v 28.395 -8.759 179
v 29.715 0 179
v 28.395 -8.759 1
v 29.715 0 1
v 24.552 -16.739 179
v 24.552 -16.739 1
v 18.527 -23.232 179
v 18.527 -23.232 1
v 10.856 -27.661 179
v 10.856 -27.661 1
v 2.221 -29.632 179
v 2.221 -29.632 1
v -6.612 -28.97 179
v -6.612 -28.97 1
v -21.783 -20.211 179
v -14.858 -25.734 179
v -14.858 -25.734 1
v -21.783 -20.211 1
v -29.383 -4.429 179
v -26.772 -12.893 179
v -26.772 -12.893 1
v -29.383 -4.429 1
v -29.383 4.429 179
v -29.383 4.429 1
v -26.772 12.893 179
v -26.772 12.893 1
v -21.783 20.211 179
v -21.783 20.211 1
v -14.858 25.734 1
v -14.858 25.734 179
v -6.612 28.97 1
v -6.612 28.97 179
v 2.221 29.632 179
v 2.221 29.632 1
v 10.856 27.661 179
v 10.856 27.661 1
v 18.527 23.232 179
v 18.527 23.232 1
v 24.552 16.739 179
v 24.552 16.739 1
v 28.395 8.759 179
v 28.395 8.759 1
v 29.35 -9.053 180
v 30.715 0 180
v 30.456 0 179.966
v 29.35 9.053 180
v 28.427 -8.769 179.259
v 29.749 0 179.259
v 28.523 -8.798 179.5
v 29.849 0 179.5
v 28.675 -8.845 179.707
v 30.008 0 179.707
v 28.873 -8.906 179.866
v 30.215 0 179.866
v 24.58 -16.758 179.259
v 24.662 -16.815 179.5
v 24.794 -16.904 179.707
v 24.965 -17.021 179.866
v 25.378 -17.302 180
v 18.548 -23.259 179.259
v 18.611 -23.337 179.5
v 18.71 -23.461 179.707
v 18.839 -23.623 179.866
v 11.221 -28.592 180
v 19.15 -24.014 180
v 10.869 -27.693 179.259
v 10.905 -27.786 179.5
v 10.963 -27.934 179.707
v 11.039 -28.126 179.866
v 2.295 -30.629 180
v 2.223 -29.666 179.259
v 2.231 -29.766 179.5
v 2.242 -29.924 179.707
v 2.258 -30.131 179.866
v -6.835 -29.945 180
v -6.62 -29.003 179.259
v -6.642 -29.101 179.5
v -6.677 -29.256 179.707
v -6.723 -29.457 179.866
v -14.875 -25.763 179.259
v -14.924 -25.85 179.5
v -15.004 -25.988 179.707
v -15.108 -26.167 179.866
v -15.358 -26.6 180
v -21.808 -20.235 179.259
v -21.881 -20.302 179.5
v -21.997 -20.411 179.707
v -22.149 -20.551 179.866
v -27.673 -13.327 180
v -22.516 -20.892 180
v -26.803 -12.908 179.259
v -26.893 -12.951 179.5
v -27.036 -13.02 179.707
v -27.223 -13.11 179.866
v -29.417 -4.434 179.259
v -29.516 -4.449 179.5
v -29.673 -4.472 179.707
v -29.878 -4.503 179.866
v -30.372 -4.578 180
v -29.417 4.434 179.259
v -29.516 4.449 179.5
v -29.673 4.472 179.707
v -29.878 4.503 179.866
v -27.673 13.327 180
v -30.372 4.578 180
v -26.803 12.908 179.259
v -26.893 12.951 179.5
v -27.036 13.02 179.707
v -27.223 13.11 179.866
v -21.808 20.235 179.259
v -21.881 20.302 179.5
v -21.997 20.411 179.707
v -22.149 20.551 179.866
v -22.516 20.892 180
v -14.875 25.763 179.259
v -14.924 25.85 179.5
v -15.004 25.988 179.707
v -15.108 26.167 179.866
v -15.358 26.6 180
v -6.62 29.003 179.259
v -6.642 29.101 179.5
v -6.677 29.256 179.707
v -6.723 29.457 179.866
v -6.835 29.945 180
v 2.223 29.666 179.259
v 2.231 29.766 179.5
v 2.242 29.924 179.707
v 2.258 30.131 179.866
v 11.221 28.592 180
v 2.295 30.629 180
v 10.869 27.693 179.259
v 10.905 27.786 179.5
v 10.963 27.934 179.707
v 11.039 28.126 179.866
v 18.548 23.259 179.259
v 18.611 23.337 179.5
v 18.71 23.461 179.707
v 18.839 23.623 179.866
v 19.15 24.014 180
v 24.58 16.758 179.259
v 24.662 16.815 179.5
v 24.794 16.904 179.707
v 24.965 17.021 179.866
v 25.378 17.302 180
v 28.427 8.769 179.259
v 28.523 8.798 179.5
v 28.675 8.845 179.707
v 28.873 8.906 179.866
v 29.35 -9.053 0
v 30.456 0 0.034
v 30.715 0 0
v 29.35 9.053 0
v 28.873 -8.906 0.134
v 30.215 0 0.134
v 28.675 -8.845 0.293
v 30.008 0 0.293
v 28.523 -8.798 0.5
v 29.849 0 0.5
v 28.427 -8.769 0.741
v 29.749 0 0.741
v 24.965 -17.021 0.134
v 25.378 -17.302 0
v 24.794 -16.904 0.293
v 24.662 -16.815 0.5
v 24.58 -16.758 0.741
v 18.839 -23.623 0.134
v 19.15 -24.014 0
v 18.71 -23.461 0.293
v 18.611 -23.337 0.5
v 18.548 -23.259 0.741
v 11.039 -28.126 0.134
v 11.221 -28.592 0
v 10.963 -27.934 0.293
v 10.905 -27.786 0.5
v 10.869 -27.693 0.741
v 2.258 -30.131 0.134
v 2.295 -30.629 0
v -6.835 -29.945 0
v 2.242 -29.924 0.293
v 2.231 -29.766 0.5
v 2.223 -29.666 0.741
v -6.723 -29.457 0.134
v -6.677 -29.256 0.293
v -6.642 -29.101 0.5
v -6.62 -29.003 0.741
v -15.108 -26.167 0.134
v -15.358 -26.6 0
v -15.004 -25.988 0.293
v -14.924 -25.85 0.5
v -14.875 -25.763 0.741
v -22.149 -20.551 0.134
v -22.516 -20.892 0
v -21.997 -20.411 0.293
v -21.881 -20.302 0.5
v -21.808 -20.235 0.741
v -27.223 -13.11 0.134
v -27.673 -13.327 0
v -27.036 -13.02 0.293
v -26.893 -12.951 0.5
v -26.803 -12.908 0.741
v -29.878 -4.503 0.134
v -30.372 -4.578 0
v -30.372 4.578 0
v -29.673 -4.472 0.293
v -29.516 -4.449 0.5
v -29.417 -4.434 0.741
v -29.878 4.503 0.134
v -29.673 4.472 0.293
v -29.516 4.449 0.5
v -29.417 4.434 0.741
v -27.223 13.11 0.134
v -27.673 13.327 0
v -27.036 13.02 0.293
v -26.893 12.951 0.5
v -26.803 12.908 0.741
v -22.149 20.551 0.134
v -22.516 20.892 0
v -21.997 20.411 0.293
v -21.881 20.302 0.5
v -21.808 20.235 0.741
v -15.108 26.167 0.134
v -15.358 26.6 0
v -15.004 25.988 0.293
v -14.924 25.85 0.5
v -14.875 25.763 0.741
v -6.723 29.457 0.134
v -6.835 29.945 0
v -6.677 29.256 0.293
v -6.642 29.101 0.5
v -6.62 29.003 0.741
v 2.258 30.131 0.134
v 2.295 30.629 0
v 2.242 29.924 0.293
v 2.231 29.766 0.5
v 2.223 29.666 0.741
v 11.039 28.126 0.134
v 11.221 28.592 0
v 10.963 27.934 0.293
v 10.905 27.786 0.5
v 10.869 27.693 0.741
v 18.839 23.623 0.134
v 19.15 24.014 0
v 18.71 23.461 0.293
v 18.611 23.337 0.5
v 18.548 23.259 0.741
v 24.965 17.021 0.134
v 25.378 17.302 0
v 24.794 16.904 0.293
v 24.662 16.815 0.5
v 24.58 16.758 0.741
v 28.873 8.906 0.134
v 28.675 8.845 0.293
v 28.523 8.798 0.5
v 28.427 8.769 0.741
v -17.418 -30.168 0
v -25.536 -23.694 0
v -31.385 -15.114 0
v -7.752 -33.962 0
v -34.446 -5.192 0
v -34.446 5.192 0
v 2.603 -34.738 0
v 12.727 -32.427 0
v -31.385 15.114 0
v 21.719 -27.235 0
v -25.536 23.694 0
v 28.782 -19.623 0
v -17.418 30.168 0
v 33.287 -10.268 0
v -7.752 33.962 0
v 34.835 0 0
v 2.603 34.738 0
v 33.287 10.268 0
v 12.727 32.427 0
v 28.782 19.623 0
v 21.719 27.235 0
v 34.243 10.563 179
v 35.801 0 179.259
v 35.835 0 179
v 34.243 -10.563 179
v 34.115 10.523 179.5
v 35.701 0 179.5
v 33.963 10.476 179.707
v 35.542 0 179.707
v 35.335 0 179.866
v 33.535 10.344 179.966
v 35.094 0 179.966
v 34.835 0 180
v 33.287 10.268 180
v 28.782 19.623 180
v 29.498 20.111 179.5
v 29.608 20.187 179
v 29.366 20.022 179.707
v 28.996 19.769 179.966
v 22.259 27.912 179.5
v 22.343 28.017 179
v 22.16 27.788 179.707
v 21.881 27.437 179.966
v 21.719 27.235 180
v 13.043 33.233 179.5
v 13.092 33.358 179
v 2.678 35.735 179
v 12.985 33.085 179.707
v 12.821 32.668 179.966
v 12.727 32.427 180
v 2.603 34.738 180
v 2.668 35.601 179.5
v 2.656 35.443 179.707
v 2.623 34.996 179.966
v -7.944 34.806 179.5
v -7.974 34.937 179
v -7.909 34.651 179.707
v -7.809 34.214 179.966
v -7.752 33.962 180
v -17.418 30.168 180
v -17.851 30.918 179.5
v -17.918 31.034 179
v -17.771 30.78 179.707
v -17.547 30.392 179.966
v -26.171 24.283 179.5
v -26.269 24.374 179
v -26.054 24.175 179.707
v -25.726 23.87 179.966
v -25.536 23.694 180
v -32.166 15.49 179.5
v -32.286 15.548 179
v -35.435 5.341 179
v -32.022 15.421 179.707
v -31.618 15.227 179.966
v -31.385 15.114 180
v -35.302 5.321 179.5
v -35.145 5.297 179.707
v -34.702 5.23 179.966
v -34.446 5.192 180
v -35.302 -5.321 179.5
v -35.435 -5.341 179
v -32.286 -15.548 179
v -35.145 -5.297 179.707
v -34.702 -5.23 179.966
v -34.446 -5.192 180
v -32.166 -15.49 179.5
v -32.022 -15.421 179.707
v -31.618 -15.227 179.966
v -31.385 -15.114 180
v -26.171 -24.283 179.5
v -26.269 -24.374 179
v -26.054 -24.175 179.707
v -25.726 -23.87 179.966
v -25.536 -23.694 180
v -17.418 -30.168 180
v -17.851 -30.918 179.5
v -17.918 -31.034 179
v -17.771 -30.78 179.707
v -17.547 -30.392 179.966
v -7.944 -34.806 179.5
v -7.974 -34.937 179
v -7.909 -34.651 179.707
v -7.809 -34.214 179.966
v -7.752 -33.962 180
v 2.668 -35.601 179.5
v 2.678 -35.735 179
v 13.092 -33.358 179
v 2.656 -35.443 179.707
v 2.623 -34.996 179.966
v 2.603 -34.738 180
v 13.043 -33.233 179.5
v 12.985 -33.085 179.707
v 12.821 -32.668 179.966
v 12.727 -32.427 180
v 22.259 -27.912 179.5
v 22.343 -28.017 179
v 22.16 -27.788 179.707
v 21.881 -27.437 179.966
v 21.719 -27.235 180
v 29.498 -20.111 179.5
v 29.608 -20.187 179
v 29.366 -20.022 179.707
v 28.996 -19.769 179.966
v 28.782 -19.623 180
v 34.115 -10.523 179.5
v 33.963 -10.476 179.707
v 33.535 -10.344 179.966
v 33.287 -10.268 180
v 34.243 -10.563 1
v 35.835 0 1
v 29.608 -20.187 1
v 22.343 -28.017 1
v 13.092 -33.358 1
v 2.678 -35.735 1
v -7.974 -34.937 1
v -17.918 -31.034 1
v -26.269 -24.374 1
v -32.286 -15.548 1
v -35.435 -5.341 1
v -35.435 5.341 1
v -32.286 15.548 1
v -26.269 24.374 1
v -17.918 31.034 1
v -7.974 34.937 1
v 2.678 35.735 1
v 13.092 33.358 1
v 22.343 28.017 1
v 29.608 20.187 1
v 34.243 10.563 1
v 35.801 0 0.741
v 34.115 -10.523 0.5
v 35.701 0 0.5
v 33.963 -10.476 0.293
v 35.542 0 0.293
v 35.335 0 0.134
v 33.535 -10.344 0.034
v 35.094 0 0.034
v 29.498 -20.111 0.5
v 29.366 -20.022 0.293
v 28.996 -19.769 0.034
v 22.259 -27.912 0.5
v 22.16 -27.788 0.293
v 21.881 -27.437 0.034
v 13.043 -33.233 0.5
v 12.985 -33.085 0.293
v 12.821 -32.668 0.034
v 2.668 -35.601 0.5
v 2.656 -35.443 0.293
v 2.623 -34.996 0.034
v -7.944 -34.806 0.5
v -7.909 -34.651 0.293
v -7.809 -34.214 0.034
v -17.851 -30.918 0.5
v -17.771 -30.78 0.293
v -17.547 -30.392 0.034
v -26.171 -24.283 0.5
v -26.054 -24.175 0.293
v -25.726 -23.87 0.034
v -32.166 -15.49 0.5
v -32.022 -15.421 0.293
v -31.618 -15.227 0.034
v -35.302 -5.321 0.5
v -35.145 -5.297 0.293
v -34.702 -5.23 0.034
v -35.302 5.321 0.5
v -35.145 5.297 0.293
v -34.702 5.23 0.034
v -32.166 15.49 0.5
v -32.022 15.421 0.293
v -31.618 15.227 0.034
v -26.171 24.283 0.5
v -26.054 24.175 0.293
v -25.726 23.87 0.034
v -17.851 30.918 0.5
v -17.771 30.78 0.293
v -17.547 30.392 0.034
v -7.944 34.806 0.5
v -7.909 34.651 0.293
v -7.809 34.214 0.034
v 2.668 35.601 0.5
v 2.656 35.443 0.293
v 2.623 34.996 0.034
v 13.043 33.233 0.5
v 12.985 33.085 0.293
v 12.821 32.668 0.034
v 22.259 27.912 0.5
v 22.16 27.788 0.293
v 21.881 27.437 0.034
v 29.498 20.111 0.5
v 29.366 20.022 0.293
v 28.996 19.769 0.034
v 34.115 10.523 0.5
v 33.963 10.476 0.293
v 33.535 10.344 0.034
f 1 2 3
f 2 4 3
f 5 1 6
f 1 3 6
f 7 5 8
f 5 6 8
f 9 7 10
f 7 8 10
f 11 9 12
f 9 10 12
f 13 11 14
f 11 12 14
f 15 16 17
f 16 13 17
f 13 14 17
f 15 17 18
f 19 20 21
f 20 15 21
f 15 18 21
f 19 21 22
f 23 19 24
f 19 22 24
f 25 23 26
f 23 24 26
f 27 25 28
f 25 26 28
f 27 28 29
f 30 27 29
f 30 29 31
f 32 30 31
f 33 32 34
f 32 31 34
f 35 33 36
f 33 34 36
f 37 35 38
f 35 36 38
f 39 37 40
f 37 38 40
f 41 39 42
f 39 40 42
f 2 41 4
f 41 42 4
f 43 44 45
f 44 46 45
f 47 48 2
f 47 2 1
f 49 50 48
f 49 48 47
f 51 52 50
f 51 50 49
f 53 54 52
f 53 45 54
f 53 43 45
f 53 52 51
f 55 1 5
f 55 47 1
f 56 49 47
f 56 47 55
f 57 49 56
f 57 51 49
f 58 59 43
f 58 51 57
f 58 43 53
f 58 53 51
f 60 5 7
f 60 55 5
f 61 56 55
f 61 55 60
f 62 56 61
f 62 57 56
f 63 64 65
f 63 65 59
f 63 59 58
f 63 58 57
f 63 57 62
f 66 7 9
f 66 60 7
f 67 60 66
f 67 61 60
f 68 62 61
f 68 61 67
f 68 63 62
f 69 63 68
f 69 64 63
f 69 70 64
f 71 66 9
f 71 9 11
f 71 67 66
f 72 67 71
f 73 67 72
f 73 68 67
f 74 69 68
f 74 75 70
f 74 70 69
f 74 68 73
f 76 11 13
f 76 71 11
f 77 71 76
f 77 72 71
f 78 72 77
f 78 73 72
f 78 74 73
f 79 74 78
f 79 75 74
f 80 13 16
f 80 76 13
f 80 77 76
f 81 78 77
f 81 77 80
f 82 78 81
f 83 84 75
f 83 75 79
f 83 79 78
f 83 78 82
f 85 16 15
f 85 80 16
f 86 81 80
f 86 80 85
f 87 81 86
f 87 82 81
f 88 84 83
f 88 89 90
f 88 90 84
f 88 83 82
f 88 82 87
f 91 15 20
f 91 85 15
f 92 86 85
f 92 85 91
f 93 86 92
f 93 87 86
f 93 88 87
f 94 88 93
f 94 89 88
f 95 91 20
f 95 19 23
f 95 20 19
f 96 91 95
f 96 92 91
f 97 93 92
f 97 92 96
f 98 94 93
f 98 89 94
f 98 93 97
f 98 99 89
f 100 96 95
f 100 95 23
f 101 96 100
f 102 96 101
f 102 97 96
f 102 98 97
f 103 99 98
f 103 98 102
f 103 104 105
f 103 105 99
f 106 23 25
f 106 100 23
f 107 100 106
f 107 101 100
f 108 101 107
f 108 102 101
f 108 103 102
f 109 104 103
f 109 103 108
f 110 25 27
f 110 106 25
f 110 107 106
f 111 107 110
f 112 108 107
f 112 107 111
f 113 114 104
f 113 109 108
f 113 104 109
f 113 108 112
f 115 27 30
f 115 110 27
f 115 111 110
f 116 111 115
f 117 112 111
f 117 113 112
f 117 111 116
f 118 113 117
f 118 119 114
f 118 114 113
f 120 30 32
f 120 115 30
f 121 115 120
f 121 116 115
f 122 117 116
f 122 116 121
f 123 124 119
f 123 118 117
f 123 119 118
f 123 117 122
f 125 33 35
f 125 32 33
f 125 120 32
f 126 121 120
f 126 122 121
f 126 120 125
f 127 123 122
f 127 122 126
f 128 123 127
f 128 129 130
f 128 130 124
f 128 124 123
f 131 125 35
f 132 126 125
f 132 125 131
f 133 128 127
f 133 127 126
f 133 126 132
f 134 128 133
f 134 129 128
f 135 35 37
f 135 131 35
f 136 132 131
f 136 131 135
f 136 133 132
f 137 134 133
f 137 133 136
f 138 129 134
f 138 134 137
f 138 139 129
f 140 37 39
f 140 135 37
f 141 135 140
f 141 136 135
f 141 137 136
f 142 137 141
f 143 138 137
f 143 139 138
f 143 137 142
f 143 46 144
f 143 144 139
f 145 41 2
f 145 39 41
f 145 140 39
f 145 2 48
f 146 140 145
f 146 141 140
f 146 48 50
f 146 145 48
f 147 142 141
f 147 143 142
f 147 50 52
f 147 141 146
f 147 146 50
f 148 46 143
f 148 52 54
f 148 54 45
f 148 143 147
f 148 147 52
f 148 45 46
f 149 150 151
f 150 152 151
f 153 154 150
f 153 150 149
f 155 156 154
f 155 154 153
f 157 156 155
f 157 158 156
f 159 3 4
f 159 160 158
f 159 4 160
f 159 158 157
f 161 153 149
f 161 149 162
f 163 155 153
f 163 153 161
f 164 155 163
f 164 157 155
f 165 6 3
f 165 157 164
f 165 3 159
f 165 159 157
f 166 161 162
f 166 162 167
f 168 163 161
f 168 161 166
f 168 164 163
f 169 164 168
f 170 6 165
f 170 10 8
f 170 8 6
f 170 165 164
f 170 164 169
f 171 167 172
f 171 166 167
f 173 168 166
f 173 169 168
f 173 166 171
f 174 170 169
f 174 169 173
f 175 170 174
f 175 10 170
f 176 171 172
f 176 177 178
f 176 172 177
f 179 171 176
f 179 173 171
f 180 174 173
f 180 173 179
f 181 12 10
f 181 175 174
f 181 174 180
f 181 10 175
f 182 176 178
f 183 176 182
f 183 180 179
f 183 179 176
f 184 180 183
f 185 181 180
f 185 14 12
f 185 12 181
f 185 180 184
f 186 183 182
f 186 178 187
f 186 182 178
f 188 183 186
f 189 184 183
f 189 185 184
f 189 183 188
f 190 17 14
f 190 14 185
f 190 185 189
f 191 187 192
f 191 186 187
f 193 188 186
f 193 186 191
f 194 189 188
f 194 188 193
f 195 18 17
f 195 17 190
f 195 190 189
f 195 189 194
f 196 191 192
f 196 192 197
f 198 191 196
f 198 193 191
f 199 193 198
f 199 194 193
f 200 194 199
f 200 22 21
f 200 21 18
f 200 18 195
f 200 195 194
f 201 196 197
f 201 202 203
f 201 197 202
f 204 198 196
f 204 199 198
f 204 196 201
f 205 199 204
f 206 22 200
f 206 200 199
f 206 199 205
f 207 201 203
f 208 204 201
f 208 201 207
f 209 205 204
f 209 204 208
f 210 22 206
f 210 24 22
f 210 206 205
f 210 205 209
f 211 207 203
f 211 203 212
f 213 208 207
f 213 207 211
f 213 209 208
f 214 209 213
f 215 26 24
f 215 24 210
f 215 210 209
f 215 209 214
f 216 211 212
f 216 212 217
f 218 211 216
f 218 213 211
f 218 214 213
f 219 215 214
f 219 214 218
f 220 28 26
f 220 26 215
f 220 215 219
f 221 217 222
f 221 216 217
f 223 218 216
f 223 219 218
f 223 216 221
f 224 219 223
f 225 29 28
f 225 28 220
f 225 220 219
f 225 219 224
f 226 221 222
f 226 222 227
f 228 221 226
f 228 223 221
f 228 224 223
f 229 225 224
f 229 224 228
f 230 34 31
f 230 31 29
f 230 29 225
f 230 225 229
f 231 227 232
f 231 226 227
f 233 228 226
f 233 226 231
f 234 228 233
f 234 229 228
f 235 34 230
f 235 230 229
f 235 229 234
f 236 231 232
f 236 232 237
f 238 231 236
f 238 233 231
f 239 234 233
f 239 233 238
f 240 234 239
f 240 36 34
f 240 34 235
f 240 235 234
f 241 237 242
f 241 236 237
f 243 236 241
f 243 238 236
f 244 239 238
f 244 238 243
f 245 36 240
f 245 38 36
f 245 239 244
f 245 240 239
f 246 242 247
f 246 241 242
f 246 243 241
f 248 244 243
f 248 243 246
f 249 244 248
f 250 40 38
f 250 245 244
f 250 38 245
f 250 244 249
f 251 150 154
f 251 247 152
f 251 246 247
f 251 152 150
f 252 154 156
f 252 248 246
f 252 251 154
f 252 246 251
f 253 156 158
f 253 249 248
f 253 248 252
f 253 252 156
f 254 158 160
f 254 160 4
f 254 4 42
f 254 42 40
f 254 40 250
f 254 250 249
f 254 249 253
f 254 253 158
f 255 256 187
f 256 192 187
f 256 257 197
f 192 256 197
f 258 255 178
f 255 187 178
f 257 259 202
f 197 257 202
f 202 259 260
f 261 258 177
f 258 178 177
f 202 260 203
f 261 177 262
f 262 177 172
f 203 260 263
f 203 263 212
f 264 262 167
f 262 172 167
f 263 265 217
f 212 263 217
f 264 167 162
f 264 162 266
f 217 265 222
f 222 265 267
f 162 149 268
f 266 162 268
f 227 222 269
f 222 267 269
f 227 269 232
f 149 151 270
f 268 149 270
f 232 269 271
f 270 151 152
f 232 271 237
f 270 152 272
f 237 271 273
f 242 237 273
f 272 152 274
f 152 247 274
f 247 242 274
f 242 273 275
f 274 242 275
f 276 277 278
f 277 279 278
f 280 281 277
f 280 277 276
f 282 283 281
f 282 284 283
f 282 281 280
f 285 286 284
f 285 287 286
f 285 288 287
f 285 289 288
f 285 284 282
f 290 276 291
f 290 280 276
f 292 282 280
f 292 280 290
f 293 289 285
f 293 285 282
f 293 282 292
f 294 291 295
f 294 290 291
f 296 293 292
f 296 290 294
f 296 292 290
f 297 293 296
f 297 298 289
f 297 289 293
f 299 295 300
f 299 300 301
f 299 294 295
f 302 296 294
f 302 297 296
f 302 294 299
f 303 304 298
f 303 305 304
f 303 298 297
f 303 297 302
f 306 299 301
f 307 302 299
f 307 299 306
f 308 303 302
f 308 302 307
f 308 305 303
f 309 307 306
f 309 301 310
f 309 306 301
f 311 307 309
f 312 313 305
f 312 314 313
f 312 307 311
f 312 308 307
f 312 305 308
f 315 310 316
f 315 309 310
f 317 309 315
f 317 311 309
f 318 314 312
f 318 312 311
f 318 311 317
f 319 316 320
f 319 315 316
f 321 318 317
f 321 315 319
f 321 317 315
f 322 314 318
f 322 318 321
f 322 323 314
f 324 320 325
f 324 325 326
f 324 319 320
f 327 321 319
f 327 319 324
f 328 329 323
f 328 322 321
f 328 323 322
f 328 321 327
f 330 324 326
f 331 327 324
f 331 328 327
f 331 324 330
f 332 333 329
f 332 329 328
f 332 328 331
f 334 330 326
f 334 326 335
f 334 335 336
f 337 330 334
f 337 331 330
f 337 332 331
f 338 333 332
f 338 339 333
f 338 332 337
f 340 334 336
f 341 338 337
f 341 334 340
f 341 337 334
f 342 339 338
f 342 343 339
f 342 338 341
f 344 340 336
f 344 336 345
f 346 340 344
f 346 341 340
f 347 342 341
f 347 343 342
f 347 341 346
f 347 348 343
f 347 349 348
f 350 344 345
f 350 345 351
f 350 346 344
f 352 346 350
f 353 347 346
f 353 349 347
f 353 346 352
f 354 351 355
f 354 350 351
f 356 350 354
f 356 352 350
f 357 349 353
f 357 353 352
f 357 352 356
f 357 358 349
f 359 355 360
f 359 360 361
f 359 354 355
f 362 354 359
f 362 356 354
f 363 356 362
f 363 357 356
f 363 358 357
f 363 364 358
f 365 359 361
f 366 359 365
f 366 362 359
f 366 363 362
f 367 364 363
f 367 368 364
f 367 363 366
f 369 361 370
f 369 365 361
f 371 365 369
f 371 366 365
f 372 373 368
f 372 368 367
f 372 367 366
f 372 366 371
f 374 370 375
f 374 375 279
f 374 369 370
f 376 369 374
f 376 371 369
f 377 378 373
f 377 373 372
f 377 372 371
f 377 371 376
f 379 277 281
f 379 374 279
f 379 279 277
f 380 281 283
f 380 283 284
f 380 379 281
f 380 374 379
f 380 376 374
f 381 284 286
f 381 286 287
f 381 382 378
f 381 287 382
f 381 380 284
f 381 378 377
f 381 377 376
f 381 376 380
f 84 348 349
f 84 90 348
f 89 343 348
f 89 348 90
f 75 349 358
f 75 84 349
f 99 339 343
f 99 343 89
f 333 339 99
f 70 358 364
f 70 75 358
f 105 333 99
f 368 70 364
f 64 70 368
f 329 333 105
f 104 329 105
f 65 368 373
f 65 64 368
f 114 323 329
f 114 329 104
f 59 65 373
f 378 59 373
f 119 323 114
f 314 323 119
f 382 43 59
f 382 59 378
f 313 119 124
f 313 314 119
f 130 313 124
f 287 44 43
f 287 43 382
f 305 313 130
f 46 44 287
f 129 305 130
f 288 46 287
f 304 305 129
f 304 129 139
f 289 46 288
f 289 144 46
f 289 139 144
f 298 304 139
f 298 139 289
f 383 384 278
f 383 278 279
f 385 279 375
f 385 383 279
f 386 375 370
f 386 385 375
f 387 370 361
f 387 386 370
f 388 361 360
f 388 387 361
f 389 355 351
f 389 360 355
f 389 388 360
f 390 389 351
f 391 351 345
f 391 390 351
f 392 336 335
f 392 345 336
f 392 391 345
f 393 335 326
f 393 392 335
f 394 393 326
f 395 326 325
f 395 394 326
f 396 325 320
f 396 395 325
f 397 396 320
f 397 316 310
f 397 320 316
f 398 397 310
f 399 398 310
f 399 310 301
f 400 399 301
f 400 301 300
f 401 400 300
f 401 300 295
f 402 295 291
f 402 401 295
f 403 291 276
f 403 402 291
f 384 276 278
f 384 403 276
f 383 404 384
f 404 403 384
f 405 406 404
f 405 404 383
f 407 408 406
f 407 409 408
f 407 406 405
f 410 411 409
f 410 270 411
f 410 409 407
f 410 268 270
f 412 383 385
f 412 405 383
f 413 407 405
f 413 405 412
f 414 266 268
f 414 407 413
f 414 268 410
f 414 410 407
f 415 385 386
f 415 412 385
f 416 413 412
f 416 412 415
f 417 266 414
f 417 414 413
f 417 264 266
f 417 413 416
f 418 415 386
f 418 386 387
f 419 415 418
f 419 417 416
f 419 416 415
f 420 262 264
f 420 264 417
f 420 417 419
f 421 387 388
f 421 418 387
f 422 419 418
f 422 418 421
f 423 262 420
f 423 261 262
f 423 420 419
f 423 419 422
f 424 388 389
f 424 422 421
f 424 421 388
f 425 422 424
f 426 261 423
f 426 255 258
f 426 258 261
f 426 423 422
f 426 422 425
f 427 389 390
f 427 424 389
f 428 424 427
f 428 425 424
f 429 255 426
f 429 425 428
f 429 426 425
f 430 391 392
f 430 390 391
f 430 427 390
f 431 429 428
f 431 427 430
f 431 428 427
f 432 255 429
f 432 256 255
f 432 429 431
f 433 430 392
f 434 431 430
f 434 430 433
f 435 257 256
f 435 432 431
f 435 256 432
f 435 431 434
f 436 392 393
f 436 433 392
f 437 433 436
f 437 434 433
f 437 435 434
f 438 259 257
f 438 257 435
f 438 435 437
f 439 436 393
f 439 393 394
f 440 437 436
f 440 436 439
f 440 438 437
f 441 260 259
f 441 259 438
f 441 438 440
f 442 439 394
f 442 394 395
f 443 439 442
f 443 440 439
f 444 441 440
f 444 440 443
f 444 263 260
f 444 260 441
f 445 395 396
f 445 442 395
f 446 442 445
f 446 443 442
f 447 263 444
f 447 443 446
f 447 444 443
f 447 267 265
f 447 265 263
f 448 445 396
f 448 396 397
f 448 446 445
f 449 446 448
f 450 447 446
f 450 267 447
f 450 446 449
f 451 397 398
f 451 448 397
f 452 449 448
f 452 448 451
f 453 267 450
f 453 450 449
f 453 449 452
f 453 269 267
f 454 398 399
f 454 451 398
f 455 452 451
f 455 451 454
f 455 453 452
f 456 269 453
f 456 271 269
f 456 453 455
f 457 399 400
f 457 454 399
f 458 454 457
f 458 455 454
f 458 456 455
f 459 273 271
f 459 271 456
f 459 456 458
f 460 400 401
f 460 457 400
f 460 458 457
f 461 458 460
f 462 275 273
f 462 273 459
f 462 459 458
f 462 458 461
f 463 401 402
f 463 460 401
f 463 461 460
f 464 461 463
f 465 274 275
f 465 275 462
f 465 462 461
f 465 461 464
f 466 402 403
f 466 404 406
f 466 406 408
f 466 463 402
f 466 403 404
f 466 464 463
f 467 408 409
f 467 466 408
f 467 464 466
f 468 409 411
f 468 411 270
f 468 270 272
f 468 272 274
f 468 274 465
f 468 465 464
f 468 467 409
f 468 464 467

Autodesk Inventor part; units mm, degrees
ref_plane "YZ Plane" through (0, 0, 0) normal (1, 0, 0) x (0, 1, 0)
ref_plane "XZ Plane" through (0, 0, 0) normal (0, 1, 0) x (-1, 0, 0)
ref_plane "XY Plane" through (0, 0, 0) normal (0, 0, 1) x (1, 0, 0)
sketch "Sketch1" plane through (0, 0, 0) normal (0, 0, 1) x (1, 0, 0)
  circle A0 centre (0, 0) radius 35.835
  circle A1 centre (0, 0) radius 29.715
  dimension "d0" = 71.67
  dimension "d1" = 59.43
extrude "Extrusion1" add sketch "Sketch1" along normal blind 180
thread "Thread1" size "M16x2" class "6g" standard "ANSI Metric M Profile" full length
fillet "Fillet1" radius 1 2 edges at (-35.835, 0, 180) (-29.715, 0, 180)
fillet "Fillet2" radius 1 2 edges at (-29.715, 0, 0) (-35.835, 0, 0)
properties part number "4111_Bias_Coil_Layer2_MPSv2_v1" material "Copper"
